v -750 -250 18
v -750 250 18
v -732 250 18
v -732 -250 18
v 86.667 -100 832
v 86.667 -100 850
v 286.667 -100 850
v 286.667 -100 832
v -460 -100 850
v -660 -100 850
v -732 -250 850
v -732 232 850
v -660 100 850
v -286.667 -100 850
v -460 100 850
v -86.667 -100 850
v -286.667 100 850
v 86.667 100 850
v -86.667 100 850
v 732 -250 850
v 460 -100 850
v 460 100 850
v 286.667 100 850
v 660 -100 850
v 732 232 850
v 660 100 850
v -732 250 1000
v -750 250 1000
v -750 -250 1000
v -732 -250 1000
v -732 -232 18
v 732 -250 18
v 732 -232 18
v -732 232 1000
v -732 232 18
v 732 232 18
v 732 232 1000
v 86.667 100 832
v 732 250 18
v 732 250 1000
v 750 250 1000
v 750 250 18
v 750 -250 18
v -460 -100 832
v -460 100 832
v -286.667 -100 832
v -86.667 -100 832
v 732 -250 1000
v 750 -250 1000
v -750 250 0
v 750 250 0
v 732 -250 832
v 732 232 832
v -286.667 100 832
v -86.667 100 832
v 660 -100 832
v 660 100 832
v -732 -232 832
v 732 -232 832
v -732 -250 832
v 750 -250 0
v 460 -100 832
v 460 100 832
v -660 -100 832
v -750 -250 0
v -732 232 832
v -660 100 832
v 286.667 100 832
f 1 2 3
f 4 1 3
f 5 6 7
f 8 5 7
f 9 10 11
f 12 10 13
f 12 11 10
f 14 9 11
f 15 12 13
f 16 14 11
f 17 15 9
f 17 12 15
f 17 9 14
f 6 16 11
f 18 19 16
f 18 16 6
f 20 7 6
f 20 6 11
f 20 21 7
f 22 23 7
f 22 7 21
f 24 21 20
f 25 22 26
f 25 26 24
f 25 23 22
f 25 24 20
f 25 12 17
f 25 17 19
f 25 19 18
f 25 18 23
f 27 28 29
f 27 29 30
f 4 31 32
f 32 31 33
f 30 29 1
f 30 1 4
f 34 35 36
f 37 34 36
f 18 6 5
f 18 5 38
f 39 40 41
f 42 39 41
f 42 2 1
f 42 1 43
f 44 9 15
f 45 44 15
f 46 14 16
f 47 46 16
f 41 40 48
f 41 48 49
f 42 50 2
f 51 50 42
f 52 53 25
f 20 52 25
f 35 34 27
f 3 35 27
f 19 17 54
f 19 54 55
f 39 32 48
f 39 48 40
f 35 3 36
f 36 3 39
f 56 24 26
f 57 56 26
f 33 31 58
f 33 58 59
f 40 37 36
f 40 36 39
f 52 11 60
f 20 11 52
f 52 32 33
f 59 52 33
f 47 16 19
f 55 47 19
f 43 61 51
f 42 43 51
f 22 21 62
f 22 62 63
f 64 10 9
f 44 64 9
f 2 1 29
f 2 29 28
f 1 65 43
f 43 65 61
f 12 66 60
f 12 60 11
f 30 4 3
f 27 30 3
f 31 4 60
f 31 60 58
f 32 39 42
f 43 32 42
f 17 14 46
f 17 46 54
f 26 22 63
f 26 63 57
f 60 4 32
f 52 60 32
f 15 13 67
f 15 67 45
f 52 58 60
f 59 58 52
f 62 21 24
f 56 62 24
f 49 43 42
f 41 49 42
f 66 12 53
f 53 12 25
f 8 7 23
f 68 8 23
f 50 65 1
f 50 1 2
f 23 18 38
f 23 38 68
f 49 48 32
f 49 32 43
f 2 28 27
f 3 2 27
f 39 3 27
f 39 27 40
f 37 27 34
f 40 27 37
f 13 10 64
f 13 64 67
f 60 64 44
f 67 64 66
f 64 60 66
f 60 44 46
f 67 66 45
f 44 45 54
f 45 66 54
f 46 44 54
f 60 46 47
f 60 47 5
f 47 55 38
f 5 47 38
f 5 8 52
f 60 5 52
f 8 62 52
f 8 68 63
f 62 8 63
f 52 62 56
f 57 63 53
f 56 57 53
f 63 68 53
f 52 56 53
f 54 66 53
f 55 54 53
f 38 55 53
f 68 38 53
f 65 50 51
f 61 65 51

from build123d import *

# Parameters (mm, degrees)
SKETCH_W            = 1500
SKETCH_H            = 500
PAD_DEPTH           = 18
SKETCH001_W         = 18
SKETCH001_H         = 500
PAD001_DEPTH        = 982
SKETCH002_W         = 18
SKETCH002_H         = 500
PAD002_DEPTH        = 982
SKETCH003_W         = 1464
SKETCH003_H         = 18
PAD003_DEPTH        = 982
SKETCH004_W         = 1464
SKETCH004_H         = 18
PAD004_DEPTH        = 814
SKETCH005_W         = 1464
SKETCH005_H         = 18
PAD005_DEPTH        = 482
SKETCH006_W         = 200
SKETCH006_H         = 200
POCKET_DEPTH        = 3100.820489
LINEARPATTERN_COUNT = 4
LINEARPATTERN_PITCH = 373.333333


with BuildPart() as boden:
    # Sketch → Pad (new body)
    with BuildSketch(Plane.XY):
        Rectangle(SKETCH_W, SKETCH_H)
    extrude(amount=PAD_DEPTH)


with BuildPart() as wandrechts:
    # Sketch001 (on Face1 of ShapeBinder) → Pad001 (new body)
    with BuildSketch(Plane.XY.offset(18)):
        with Locations((741, 0)):
            Rectangle(SKETCH001_W, SKETCH001_H)
    extrude(amount=PAD001_DEPTH)


with BuildPart() as wandlinks:
    # Sketch002 (on Face1 of ShapeBinder001) → Pad002 (new body)
    with BuildSketch(Plane.XY.offset(18)):
        with Locations((-741, 0)):
            Rectangle(SKETCH002_W, SKETCH002_H)
    extrude(amount=PAD002_DEPTH)


with BuildPart() as r_ckplatte:
    # Sketch003 (on Face1 of ShapeBinder002) → Pad003 (new body)
    with BuildSketch(Plane.XY.offset(18)):
        with Locations((0, 241)):
            Rectangle(SKETCH003_W, SKETCH003_H)
    extrude(amount=PAD003_DEPTH)


with BuildPart() as vorderplatte:
    # Sketch004 (on Face1 of ShapeBinder003) → Pad004 (new body)
    with BuildSketch(Plane.XY.offset(18)):
        with Locations((0, -241)):
            Rectangle(SKETCH004_W, SKETCH004_H)
    extrude(amount=PAD004_DEPTH)


with BuildPart() as zwischenplatte:
    # Sketch005 (on Face1 of ShapeBinder004) → Pad005 (new body)
    with BuildSketch(Plane(origin=(0, 232, 18), x_dir=(1, 0, 0), z_dir=(0, -1, 0))):
        with Locations((0, 823)):
            Rectangle(SKETCH005_W, SKETCH005_H)
    extrude(amount=PAD005_DEPTH)

    # Sketch006 (on Face1 of Pad005) → Pocket (cut, through all)
    with BuildSketch(Plane.XY.offset(850)):
        with Locations((-560, 0)):
            Rectangle(SKETCH006_W, SKETCH006_H)
    pocket = extrude(amount=-POCKET_DEPTH, mode=Mode.SUBTRACT)

    # LinearPattern: Pocket ×4
    with Locations(*[(i * LINEARPATTERN_PITCH, 0, 0) for i in range(1, LINEARPATTERN_COUNT)]):
        add(pocket, mode=Mode.SUBTRACT)


solid = Compound([boden.part, wandrechts.part, wandlinks.part, r_ckplatte.part, vorderplatte.part, zwischenplatte.part])
